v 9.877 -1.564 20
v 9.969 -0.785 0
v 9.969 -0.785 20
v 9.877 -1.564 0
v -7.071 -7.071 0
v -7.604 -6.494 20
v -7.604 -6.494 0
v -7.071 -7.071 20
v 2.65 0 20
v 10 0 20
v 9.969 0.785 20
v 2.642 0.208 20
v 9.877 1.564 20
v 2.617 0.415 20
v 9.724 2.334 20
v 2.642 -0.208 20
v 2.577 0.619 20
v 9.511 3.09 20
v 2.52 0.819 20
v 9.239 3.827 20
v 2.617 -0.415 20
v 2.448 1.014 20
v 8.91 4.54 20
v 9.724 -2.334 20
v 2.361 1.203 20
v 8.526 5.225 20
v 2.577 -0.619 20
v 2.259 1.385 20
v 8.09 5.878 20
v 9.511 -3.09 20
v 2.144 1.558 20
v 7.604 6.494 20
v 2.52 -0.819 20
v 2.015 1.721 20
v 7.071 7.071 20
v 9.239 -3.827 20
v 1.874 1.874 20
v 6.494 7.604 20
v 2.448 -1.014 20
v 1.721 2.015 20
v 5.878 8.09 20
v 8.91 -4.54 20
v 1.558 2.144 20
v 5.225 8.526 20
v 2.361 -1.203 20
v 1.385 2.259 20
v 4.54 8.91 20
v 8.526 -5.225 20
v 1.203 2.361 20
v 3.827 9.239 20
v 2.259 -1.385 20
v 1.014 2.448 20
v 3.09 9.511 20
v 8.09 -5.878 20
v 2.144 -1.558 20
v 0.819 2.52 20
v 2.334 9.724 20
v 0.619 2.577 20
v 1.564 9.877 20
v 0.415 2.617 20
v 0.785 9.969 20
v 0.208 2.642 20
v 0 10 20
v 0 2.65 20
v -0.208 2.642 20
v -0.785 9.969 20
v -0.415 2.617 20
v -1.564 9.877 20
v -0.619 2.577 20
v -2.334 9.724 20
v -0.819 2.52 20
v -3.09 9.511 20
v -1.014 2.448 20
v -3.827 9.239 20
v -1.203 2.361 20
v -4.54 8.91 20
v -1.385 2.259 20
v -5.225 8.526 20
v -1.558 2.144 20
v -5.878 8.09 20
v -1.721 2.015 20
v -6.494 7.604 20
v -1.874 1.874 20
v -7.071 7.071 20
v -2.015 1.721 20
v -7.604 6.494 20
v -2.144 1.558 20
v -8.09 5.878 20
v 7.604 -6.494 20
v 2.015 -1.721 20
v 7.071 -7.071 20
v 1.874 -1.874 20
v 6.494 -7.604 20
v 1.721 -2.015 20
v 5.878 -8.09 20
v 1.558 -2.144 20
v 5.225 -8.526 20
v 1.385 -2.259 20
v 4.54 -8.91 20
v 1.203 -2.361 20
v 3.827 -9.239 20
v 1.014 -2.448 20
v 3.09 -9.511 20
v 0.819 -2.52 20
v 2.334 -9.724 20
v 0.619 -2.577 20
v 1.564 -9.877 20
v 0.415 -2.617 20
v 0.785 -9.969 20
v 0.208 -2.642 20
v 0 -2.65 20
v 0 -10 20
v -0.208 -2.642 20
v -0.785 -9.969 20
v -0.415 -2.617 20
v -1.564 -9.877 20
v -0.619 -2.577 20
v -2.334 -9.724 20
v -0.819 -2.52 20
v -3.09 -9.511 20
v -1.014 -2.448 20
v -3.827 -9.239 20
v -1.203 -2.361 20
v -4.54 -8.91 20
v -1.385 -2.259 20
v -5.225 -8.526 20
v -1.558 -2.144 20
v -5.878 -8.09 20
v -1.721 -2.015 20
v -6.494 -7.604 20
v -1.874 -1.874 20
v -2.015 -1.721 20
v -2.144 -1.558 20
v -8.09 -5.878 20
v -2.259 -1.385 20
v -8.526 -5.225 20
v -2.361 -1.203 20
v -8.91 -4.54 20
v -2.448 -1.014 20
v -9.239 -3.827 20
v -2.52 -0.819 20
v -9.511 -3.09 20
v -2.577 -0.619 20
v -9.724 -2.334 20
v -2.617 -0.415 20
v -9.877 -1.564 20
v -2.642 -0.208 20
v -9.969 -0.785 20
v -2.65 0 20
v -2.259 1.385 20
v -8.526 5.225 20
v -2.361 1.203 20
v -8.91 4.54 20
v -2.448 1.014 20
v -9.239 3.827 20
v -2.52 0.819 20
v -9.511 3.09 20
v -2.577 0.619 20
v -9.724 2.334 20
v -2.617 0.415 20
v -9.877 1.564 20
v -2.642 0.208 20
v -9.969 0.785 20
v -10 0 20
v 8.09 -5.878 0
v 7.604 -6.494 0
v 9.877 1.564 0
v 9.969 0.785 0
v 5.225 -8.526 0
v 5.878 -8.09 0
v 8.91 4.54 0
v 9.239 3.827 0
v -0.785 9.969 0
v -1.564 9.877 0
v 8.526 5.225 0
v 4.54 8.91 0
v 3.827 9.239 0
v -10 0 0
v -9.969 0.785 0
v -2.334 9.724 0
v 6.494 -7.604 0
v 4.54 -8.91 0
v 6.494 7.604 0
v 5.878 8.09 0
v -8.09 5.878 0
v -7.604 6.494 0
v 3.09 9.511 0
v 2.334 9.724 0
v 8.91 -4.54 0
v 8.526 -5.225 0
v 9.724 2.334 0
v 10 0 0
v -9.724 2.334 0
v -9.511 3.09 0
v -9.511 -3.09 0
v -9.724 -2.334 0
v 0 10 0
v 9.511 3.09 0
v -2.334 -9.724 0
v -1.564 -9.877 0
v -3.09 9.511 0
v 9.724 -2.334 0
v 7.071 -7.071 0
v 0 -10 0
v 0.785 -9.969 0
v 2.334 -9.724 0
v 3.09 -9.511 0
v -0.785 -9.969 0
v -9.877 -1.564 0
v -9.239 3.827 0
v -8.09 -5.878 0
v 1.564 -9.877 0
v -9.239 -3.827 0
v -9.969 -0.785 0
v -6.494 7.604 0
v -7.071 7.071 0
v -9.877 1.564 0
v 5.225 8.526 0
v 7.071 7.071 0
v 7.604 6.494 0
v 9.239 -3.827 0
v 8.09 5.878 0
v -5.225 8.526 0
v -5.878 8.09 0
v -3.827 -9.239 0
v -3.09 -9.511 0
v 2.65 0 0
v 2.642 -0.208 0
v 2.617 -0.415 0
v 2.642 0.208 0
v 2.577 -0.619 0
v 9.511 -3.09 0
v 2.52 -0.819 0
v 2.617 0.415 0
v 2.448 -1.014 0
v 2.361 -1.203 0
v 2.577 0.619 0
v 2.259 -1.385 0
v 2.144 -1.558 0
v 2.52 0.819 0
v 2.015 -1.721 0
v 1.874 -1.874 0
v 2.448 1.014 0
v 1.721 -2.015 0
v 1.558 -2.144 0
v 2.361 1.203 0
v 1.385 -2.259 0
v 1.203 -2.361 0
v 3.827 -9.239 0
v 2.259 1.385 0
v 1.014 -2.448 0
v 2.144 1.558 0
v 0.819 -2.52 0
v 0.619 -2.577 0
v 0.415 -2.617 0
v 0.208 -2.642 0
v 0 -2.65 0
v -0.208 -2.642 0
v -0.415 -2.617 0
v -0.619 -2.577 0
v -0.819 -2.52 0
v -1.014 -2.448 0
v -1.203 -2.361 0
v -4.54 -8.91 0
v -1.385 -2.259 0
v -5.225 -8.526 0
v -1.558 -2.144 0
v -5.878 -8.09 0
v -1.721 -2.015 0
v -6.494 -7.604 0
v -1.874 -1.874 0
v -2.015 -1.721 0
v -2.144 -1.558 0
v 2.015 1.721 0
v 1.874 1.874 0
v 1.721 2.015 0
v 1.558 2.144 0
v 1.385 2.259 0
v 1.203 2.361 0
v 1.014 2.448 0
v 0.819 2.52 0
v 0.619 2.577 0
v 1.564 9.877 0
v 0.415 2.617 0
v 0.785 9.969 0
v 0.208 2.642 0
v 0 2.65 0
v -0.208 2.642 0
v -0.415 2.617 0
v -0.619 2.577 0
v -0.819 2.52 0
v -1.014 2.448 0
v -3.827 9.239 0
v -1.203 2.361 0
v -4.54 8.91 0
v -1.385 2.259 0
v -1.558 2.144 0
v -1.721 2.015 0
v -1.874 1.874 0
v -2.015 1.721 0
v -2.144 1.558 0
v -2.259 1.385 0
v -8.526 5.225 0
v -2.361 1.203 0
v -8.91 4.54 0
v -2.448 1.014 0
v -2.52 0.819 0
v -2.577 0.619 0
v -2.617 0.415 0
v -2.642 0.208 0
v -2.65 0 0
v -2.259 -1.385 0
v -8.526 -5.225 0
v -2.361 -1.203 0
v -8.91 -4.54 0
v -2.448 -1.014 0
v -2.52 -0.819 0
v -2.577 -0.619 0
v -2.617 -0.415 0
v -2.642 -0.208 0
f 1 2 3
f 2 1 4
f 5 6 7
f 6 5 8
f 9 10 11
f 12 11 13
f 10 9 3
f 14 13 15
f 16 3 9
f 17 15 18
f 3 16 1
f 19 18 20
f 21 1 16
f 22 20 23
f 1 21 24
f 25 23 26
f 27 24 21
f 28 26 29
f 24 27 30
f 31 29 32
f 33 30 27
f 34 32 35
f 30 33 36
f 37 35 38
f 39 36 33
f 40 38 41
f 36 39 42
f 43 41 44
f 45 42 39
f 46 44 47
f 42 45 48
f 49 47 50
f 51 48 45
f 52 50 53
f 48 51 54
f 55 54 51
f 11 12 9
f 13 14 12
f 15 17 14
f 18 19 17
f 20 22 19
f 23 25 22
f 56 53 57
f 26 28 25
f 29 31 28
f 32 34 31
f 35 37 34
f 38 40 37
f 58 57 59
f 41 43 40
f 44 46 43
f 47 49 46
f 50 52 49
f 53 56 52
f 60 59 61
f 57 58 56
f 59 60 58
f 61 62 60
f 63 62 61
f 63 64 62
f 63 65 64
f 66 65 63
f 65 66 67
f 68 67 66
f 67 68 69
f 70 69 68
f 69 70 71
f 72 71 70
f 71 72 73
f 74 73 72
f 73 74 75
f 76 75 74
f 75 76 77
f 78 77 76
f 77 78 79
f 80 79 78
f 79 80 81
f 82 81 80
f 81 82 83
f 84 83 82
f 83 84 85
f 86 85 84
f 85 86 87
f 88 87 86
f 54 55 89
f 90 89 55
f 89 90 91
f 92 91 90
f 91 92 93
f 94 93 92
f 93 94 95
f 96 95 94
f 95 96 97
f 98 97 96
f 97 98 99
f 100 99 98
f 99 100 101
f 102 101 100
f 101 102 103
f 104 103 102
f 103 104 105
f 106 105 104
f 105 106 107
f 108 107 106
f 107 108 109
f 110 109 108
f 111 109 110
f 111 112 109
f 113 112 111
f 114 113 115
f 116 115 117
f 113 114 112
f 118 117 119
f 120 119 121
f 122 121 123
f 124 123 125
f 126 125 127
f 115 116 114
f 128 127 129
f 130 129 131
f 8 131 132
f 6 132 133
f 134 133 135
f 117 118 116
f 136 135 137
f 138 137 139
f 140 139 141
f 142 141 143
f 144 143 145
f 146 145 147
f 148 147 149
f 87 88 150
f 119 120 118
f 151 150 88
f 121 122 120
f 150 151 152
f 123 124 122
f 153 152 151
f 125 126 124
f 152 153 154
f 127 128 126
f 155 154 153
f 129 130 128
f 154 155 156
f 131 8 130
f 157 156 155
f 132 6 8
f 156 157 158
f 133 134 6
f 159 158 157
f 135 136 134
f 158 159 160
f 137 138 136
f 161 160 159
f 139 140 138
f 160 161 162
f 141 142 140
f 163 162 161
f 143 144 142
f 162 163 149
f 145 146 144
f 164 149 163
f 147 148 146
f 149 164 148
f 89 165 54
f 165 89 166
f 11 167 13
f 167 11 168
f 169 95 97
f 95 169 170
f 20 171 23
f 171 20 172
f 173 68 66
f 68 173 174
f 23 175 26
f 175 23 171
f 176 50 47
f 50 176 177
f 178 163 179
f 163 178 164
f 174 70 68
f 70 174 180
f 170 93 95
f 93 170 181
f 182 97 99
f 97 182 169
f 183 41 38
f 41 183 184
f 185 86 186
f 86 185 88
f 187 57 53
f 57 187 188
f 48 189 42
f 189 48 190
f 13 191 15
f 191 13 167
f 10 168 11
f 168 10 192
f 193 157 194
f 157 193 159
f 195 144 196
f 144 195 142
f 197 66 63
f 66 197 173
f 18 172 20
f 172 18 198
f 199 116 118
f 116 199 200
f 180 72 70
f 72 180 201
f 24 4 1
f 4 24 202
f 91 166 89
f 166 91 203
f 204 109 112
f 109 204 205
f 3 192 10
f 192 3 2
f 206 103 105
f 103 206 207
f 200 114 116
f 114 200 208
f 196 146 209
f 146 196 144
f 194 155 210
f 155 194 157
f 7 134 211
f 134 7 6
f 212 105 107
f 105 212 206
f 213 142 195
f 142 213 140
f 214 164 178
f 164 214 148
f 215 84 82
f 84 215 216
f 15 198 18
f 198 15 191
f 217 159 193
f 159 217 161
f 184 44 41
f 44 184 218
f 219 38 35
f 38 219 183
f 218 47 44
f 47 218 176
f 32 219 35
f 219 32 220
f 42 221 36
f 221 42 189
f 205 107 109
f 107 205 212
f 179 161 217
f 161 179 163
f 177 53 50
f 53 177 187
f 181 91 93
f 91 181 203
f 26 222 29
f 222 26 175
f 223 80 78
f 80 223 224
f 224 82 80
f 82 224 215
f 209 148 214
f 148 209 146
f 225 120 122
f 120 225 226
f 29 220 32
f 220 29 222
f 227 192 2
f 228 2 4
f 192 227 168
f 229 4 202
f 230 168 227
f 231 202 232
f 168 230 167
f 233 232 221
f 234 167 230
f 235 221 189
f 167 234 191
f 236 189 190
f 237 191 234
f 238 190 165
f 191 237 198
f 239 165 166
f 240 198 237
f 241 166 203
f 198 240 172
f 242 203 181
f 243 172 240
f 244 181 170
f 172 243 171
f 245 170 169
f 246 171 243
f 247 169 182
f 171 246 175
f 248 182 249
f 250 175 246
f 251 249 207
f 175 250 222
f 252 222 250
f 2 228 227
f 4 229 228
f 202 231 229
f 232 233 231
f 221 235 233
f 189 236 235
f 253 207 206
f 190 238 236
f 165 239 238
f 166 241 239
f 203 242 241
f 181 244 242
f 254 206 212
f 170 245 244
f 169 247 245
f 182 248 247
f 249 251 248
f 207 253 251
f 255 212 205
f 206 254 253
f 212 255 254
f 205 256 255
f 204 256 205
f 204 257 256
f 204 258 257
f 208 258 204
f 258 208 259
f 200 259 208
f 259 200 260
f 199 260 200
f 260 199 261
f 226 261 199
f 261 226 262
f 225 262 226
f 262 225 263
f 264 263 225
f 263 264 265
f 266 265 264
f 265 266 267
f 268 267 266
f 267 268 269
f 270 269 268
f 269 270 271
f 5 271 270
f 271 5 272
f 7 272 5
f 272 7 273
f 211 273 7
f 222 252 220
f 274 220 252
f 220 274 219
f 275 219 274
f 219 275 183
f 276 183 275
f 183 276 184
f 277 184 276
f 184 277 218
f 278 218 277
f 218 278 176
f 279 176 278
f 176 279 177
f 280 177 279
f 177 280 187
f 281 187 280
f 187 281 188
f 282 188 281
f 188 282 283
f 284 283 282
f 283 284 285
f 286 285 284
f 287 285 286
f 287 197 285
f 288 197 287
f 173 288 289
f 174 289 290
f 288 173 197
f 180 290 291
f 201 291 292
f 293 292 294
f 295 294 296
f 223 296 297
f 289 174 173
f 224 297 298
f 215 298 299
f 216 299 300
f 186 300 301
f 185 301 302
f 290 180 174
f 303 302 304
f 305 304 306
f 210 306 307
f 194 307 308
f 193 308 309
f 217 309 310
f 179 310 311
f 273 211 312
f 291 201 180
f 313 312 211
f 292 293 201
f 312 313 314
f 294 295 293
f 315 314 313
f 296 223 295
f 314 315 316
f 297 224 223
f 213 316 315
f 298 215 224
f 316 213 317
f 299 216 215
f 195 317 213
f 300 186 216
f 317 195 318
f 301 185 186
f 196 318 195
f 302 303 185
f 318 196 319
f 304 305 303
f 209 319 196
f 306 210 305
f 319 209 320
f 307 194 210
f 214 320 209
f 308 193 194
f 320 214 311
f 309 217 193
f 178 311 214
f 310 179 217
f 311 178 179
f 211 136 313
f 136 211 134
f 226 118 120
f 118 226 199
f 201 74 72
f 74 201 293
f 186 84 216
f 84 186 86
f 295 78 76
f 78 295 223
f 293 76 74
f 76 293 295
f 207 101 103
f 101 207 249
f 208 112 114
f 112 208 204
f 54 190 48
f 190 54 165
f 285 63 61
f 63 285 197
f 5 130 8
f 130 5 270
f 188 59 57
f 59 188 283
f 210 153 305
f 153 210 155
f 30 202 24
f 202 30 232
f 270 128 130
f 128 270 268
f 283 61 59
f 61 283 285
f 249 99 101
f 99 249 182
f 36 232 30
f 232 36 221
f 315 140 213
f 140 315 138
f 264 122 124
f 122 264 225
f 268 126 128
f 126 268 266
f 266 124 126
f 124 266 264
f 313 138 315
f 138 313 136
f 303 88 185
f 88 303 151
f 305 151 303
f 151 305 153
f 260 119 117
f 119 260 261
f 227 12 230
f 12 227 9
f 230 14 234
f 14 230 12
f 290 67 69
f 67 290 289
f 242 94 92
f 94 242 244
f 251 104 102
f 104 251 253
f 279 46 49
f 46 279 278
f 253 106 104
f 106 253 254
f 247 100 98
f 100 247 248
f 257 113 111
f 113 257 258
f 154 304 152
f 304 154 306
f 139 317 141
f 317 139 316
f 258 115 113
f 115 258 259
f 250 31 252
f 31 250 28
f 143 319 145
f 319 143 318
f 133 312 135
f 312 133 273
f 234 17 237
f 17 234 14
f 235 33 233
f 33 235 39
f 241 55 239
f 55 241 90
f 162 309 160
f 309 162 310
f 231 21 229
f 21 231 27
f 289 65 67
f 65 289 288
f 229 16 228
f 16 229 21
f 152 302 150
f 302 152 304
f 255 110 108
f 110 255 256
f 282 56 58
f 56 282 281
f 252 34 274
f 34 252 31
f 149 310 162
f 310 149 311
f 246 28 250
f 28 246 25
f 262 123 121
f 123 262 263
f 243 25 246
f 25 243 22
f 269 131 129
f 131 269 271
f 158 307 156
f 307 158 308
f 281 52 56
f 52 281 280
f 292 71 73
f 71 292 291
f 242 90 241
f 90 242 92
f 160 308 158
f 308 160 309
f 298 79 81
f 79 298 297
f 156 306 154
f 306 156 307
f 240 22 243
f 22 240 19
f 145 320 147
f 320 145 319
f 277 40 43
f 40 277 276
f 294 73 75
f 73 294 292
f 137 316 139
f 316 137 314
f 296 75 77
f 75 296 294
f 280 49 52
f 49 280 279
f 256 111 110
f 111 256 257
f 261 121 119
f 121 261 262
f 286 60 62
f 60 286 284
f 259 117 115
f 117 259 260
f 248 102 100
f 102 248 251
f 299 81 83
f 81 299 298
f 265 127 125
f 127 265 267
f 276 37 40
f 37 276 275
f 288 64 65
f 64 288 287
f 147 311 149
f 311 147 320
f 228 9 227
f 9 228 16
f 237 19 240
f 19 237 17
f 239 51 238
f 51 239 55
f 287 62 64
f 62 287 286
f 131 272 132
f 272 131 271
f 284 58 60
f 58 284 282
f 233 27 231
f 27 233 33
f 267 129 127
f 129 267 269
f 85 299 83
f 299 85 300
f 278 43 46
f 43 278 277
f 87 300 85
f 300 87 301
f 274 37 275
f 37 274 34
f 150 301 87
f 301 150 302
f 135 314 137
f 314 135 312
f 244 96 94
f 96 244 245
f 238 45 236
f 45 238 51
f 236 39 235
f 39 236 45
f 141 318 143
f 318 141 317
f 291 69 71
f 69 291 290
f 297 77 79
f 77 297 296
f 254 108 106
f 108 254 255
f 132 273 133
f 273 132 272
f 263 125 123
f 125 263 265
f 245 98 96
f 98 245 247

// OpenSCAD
module _washer(outer_d, inner_d, h) {
    $fn=80;
    difference() {
        cylinder(d=outer_d,h=h);
        cylinder(d=inner_d,h=h*3,center=true);
    }
}

module washer_M4(h=1) {
    _washer(7.5, 4.5, h);
}

module washer_tronxy_idler() {
    _washer(7.8, 5.4, 0.6);
}

module tronxy_idler_spacer() {
    $fn=40;
    difference() {
        hull() {
            cylinder(d=7.8, h=4.2);
            cylinder(d=8.8, h=3.7);
        }
        cylinder(d=5.4,h=5);
    }
}

module washer_13_8_1() {
    _washer(13, 8, 1);
}

module washer_8_5_1() {
    _washer(8, 5.3, 1);
}

module washer_7_5_2() {
    _washer(7, 5.3, 2);
}

module washer_7_5_2_5() {
    _washer(7, 5.3, 2.5);
}

module washer_20_5_20() {
    _washer(20, 5.3, 20);
}

module washer_plate(count_side, outer_d, inner_d, h) {
    union() {
        for (i = [0:count_side-1]) {
            for (j = [0:count_side-1]) {
                translate([i*(outer_d+1),j*(outer_d+1),0])
                _washer(outer_d, inner_d, h);
            }
        }
        
        for (i = [0:count_side-2]) {
            for (j = [0:count_side-1]) {
                translate([i*(outer_d+1)+outer_d/2+1/2,
                           j*(outer_d+1), 0.2/2])
                cube([1.2,1,0.2],center=true);
            }
        }
        
        for (i = [0:count_side-1]) {
            for (j = [0:count_side-2]) {
                translate([i*(outer_d+1),
                           j*(outer_d+1)+outer_d/2+1/2, 0.2/2])
                cube([1,1.2,0.2],center=true);
            }
        }
    }
}

//washer_M4(1.8);
//washer_tronxy_idler();
//tronxy_idler_spacer();
//washer_13_8_1();
//washer_7_5_2();
//washer_7_5_2_5();
washer_20_5_20();

//washer_plate(4, 8.5, 3.2, 0.8);
